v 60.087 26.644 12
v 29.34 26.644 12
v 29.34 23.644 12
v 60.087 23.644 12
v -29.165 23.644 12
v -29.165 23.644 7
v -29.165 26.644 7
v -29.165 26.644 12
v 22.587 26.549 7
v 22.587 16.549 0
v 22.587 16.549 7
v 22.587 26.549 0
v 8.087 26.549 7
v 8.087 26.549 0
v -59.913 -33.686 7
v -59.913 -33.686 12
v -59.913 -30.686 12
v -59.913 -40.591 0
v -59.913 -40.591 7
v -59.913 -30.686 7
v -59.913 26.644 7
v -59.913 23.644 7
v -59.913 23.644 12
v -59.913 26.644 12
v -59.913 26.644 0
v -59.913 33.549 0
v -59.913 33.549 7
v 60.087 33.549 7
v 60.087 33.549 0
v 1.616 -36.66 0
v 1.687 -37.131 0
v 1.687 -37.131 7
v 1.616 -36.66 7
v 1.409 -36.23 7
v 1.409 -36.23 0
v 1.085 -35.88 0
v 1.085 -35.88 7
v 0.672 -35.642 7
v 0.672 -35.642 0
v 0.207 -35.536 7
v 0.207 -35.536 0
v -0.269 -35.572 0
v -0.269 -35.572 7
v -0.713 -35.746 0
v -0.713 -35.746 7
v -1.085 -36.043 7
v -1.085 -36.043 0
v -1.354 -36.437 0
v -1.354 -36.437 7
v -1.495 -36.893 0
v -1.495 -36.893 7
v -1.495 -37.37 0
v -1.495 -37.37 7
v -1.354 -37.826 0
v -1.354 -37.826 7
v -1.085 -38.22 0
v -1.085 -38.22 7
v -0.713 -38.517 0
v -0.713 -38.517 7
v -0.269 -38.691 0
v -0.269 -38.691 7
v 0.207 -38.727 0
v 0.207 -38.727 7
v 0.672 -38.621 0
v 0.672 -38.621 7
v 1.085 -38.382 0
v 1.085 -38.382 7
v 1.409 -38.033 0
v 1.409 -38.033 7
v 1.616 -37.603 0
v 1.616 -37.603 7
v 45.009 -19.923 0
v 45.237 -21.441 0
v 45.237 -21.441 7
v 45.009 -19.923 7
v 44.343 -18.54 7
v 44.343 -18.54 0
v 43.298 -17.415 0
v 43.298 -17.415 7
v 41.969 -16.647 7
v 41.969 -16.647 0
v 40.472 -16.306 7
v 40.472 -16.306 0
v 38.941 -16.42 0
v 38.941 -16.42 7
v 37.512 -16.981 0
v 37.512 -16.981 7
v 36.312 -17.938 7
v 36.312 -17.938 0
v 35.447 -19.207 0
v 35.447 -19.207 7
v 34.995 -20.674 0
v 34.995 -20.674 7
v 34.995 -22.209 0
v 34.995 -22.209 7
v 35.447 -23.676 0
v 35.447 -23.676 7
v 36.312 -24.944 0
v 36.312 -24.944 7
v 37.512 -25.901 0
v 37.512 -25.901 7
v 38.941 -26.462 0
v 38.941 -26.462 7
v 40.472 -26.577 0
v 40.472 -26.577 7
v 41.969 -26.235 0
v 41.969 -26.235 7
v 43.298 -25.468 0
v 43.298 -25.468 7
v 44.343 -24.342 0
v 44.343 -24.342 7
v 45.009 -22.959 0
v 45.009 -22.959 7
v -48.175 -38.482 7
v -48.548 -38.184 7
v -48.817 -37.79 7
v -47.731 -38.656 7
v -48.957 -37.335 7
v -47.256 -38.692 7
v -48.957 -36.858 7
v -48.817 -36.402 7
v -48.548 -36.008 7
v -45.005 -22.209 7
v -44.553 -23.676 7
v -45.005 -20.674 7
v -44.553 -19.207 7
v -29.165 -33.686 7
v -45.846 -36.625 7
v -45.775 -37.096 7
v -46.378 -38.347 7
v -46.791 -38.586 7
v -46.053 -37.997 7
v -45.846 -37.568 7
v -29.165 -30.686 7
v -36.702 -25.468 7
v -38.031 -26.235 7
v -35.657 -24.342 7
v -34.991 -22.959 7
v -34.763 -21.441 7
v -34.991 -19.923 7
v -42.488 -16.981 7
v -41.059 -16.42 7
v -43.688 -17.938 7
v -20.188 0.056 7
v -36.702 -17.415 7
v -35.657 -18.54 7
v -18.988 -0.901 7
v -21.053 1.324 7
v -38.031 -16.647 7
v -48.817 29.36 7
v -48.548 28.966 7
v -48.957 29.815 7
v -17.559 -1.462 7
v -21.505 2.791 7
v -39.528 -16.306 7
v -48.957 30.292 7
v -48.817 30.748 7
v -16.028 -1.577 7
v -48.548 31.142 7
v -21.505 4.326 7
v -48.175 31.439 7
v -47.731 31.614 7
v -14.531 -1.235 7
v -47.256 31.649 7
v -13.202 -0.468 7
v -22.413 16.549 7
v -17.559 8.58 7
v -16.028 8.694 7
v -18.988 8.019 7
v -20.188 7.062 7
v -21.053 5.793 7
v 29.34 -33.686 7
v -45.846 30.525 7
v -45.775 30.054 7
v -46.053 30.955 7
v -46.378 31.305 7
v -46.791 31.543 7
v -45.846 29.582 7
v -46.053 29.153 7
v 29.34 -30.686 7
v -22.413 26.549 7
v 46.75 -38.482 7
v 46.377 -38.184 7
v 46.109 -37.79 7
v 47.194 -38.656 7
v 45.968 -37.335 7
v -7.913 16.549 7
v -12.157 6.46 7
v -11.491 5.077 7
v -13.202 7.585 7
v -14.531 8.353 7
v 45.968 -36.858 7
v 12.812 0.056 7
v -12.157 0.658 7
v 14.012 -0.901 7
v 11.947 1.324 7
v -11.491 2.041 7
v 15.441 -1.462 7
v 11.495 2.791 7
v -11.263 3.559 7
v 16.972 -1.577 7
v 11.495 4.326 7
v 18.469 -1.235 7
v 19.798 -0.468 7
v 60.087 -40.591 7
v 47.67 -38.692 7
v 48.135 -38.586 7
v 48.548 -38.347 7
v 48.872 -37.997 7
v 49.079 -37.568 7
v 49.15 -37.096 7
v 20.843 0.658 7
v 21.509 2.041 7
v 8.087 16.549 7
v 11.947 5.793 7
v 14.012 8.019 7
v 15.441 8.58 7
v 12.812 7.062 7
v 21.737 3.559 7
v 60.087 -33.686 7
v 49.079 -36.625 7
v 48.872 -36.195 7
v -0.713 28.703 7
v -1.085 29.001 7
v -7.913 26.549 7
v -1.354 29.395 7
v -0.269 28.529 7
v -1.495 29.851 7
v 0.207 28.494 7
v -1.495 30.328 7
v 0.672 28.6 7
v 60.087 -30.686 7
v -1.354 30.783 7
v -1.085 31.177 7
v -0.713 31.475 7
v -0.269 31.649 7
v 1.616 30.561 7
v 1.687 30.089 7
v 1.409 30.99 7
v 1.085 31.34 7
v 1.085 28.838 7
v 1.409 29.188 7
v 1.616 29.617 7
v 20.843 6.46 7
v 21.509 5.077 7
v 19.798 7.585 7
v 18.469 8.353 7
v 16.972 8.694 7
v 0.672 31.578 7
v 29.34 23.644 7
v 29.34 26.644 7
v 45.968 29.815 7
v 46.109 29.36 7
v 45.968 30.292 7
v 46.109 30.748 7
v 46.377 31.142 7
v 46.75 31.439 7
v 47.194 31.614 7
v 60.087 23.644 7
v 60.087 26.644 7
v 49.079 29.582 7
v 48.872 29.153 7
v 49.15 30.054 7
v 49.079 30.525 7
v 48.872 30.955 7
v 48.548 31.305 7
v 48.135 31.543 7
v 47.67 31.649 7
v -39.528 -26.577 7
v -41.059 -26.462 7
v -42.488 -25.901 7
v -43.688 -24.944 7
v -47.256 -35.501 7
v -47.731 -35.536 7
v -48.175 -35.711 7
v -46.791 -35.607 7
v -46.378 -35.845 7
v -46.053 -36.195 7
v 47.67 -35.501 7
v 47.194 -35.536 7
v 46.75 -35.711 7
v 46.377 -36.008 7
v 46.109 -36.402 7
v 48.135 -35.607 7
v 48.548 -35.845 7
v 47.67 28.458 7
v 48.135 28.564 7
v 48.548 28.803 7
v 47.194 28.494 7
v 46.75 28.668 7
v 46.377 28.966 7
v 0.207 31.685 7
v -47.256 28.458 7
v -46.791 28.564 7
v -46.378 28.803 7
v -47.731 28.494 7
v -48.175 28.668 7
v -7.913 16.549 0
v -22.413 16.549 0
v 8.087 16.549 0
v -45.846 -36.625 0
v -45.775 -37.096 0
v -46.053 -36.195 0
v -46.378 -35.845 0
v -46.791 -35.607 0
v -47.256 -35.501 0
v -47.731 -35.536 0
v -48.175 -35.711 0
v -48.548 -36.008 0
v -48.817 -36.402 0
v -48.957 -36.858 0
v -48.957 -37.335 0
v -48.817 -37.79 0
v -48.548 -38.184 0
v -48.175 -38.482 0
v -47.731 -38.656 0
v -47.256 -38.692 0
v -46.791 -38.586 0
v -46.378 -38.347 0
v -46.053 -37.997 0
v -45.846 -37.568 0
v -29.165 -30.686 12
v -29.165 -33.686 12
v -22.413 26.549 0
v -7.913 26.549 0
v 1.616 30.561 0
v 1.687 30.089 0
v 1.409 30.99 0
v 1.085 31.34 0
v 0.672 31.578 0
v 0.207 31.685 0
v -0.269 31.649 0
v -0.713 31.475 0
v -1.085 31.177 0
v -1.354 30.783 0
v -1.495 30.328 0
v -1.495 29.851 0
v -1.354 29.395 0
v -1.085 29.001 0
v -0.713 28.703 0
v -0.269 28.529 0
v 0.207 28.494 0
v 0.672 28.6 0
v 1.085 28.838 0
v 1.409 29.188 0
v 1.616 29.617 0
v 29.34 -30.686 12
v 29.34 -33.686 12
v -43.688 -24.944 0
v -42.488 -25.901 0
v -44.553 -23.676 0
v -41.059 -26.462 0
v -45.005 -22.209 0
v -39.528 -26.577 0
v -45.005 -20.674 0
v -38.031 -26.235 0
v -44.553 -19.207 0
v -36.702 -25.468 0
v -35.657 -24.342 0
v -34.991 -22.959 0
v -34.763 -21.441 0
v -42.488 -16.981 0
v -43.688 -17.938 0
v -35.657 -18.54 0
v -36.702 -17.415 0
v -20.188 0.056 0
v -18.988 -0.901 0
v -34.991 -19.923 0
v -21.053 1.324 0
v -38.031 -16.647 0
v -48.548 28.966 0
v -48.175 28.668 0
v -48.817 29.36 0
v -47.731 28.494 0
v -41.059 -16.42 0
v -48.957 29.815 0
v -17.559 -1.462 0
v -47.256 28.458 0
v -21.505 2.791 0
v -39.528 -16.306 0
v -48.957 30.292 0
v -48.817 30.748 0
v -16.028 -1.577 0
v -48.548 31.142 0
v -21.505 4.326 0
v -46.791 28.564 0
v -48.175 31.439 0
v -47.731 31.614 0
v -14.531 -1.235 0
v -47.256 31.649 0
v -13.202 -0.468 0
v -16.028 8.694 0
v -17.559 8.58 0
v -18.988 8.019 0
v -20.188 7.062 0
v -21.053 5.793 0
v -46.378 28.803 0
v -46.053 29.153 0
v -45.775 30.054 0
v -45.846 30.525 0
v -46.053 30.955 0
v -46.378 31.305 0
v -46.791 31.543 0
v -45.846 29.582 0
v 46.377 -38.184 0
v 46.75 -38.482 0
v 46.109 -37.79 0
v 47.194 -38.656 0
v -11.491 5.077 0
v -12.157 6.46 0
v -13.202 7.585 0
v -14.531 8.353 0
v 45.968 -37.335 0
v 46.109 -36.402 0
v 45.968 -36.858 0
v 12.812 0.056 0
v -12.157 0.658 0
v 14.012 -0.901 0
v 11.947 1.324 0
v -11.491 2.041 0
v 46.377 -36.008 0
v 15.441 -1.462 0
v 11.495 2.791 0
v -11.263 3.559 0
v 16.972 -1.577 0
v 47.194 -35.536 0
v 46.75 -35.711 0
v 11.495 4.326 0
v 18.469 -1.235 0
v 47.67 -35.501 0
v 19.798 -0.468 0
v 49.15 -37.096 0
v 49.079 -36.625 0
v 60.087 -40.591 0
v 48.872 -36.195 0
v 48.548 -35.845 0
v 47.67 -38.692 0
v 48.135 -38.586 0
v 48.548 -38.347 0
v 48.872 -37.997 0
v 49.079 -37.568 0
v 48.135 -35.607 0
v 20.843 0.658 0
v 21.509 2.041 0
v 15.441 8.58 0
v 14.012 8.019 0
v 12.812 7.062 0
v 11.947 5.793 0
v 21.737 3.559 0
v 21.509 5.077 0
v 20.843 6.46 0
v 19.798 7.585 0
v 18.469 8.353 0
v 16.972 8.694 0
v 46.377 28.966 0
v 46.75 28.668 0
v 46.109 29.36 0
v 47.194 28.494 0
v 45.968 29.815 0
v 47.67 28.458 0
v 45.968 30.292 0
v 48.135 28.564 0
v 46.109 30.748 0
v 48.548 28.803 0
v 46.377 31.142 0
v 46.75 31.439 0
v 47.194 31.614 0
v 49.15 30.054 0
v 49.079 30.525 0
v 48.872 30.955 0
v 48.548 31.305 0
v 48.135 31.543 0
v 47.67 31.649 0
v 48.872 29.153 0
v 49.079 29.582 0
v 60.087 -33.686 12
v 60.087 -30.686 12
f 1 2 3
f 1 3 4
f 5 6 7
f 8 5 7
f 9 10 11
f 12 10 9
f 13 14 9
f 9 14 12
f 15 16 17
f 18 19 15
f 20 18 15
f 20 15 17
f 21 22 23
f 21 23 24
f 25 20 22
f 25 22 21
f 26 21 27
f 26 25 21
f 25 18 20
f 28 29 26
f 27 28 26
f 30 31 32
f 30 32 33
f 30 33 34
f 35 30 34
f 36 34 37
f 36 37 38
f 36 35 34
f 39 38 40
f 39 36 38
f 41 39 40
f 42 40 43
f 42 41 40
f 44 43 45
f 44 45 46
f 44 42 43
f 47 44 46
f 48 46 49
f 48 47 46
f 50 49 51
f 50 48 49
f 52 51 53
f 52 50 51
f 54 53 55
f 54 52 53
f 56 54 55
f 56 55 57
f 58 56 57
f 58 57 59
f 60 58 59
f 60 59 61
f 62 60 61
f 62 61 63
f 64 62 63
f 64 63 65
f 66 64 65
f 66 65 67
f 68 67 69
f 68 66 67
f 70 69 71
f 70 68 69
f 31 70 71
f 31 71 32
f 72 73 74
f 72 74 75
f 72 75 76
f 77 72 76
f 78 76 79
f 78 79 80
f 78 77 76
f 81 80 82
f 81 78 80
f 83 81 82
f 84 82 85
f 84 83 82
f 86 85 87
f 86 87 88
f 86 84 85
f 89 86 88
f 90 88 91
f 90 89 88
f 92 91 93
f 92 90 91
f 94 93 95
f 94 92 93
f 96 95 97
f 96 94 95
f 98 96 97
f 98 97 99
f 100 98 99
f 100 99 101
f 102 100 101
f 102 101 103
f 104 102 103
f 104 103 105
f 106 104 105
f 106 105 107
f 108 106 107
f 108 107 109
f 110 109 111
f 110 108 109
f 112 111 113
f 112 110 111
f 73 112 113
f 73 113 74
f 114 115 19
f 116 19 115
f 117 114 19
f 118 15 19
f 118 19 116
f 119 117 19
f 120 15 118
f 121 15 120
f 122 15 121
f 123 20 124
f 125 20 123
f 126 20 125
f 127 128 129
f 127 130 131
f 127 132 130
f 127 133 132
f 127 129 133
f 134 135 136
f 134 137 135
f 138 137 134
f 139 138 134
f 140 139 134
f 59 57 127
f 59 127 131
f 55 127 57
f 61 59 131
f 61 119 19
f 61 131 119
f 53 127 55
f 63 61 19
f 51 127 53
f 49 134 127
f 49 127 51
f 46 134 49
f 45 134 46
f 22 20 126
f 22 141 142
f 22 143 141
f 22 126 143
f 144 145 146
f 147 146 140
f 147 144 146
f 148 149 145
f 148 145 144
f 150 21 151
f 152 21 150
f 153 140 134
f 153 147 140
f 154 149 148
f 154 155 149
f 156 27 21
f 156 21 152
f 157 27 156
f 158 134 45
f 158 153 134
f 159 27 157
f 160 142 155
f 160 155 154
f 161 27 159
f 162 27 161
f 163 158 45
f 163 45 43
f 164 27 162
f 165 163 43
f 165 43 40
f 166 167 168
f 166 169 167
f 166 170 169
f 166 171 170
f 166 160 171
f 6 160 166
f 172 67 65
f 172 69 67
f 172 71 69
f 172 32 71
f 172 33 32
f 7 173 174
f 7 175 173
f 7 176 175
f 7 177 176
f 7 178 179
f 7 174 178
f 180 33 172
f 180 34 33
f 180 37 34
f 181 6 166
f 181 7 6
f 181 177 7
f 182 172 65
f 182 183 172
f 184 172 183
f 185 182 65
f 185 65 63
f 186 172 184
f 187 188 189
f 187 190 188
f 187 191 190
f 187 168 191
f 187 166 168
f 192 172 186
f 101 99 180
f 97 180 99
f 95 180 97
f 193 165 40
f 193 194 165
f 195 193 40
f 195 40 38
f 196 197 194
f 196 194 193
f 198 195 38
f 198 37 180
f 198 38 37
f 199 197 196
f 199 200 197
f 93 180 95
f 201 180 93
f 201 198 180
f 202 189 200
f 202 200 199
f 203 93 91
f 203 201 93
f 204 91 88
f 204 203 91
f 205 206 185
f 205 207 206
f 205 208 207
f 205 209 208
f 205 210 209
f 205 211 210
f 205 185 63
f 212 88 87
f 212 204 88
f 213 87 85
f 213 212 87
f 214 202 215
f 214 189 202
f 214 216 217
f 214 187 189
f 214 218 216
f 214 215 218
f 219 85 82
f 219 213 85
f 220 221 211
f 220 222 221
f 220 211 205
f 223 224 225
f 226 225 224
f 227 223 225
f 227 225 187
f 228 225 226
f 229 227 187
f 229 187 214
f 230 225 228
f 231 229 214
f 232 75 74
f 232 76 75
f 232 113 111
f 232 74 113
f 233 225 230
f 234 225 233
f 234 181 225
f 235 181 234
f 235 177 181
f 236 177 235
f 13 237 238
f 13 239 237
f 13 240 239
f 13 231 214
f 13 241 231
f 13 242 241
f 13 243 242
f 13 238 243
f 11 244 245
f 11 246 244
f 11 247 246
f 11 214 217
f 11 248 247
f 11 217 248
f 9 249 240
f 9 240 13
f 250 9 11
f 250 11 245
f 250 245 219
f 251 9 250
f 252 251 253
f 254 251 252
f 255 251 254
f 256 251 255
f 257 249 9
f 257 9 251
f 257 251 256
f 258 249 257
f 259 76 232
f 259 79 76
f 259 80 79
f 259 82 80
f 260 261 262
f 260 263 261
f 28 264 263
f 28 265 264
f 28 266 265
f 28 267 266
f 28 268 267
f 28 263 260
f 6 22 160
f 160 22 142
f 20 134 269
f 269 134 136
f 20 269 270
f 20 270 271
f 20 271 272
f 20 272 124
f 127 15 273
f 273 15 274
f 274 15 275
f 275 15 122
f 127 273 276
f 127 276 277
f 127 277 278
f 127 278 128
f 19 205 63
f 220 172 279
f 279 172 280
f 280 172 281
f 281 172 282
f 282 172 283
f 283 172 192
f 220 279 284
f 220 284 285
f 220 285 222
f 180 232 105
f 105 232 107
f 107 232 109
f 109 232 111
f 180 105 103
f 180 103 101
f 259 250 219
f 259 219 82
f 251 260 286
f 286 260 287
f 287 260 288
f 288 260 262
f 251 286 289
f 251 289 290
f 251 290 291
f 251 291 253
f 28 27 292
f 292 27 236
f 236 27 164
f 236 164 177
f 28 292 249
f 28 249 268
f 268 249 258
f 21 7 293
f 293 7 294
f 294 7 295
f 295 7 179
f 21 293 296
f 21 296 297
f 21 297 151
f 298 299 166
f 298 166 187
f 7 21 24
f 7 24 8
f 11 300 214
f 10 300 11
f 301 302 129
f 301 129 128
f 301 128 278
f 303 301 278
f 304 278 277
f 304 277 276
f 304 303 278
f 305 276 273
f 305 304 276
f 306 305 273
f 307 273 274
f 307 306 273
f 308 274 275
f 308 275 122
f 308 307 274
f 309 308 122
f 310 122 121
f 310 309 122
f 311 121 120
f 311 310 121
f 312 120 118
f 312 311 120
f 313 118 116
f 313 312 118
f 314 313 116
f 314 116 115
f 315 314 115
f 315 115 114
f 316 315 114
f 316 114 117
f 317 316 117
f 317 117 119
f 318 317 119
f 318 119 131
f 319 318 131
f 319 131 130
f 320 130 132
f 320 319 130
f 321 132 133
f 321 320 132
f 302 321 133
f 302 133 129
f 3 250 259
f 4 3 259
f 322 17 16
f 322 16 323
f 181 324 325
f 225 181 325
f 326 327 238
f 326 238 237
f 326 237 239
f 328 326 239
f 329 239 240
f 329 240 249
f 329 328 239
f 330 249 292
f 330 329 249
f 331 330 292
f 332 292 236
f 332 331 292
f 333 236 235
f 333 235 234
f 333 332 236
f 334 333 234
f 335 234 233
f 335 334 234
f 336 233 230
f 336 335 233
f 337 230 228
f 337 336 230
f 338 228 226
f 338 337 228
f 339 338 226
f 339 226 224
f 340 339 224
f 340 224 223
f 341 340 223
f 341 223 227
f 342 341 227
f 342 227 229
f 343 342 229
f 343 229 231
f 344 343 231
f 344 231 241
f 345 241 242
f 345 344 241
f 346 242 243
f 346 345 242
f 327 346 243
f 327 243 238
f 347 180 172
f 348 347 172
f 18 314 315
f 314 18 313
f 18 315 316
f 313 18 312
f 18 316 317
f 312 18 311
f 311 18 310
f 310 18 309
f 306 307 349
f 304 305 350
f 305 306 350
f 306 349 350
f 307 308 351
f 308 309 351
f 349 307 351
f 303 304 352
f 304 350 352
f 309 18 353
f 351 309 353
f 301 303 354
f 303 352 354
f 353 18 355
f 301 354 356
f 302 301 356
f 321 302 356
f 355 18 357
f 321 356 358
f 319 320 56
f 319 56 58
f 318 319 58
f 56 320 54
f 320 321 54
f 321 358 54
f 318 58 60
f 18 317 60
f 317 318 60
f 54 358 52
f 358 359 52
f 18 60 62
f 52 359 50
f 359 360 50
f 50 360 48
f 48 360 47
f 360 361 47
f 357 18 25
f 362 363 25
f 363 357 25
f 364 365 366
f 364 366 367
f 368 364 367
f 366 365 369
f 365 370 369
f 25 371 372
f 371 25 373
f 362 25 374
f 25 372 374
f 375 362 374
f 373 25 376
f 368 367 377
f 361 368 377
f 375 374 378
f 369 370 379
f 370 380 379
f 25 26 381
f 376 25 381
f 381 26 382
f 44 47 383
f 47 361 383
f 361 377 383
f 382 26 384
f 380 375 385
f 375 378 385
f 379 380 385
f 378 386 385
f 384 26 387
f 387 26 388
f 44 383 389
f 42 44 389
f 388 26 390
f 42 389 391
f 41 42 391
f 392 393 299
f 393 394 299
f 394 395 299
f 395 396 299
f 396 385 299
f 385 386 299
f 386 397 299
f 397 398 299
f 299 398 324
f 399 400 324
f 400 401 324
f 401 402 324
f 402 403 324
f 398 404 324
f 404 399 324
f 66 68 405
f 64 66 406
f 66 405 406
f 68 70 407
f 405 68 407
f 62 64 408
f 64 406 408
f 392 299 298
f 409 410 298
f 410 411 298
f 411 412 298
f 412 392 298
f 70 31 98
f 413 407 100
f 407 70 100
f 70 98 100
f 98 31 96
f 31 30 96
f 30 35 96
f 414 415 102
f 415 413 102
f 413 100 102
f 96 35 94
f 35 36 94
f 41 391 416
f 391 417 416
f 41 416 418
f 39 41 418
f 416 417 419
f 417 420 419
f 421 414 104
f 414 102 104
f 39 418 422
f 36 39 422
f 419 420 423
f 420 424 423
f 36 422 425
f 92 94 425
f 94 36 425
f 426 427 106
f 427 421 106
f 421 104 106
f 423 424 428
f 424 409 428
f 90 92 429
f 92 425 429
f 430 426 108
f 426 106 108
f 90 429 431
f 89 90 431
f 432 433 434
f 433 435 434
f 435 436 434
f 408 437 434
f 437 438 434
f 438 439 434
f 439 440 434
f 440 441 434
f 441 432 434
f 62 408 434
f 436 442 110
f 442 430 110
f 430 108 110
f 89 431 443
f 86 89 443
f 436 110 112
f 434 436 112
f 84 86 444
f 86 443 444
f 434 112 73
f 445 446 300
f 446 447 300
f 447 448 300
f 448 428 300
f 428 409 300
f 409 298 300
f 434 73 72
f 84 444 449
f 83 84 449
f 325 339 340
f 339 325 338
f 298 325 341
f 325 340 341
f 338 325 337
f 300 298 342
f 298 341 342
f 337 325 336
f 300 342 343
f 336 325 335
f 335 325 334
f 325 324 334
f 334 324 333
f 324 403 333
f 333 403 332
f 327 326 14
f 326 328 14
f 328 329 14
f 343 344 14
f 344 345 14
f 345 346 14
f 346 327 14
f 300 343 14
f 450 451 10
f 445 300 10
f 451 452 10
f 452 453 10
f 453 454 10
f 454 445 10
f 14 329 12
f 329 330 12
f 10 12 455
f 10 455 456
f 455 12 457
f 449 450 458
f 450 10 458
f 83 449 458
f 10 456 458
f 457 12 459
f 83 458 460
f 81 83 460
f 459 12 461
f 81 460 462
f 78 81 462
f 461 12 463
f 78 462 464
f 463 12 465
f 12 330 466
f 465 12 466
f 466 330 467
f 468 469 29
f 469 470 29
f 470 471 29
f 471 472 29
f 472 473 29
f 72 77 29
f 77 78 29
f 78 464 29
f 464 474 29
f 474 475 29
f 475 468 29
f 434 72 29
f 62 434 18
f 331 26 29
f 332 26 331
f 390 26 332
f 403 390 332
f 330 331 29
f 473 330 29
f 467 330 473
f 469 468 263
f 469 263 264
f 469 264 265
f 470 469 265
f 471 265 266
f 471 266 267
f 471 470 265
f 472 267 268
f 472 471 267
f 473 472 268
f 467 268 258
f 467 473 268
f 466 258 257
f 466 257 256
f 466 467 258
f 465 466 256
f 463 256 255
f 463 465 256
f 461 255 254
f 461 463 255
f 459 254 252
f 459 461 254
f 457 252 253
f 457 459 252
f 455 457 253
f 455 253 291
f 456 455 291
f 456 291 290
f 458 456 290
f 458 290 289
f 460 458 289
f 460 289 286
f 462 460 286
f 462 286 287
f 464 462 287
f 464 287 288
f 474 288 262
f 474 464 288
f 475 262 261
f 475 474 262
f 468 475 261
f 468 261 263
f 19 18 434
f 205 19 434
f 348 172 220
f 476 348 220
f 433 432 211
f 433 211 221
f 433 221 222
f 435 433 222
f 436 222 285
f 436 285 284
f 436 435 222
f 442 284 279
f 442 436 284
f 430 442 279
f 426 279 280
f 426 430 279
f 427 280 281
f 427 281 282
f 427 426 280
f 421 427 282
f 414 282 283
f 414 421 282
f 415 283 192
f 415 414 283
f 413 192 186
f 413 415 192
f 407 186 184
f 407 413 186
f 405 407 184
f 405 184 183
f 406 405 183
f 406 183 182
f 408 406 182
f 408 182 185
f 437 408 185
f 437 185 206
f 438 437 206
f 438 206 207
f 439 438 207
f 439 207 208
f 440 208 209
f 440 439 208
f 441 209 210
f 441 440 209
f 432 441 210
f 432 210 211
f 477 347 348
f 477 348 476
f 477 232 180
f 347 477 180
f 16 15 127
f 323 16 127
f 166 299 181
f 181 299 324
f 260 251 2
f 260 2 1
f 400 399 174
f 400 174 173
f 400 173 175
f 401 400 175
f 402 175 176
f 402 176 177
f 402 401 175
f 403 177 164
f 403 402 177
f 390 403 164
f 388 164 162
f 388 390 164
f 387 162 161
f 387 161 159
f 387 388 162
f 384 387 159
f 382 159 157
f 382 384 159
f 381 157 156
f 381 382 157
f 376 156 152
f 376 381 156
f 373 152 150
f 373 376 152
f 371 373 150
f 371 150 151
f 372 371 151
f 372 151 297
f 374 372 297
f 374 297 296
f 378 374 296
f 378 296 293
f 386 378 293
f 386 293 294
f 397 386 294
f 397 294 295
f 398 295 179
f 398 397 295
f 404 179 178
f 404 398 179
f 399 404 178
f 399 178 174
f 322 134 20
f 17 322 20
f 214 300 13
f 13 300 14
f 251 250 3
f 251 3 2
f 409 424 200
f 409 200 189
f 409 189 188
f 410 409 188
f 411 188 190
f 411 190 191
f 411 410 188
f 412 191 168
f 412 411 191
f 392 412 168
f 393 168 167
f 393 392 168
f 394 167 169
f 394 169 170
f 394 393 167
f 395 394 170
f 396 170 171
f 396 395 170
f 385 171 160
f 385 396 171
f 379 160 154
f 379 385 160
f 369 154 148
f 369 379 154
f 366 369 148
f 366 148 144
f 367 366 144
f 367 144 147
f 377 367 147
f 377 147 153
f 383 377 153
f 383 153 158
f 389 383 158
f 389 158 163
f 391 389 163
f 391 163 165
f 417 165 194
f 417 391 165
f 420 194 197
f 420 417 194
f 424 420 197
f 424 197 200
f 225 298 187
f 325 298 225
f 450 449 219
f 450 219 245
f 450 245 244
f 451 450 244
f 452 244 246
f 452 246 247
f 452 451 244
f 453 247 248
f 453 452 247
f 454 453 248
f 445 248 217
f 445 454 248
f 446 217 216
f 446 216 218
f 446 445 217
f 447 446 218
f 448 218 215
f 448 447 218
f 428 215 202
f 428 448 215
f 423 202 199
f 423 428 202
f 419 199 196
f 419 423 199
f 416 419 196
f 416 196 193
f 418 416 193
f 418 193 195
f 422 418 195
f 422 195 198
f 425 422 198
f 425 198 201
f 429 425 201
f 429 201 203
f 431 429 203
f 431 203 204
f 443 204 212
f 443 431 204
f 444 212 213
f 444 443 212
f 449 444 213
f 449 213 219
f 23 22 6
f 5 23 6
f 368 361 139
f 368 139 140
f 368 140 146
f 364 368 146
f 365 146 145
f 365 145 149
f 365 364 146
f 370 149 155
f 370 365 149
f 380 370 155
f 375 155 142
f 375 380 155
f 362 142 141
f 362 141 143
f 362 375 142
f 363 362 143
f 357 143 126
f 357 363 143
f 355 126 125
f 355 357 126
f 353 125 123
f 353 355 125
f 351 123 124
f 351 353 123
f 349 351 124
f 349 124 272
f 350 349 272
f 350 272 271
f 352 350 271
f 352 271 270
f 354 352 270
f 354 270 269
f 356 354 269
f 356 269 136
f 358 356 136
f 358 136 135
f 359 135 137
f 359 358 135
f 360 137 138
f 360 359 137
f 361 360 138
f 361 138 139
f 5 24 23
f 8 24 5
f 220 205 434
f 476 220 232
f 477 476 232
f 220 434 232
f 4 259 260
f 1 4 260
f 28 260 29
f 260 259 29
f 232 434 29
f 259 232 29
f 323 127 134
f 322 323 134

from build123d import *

# Parameters (mm, degrees)
ESBO_O1_R                = 1.6
ESBO_O1_R_2              = 5.15
ESBO_O1_W                = 14.5
ESBO_O1_H                = 10
ESBO_O1_W_2              = 30.747802568
ESBO_O1_H_2              = 3
ESBO_O1_W_3              = 30.747802569
RESSALTO_EXTRUS_O1_DEPTH = 7
RESSALTO_EXTRUS_O3_START = 7
ESBO_O1_5_W              = 30.747802569
ESBO_O1_5_H              = 3
ESBO_O1_5_W_2            = 30.747802568
RESSALTO_EXTRUS_O3_DEPTH = 5


with BuildPart() as part:
    # Esboço1 → Ressalto-extrusão1 (new body)
    # profile 1 of 5: a face of its own
    with BuildSketch(Plane.XY):
        Polygon((60.087398189, 33.548797322), (-59.912601811, 33.548797322), (-59.912601811, 26.644004496), (-29.164799242, 26.644004496), (-29.164799242, 23.644004496), (-59.912601811, 23.644004496), (-59.912601811, -30.686339735), (-29.164799242, -30.686339735), (-29.164799242, -33.686339735), (-59.912601811, -33.686339735), (-59.912601811, -40.591132561), (60.087398189, -40.591132561), (60.087398189, -33.686339735), (29.339595621, -33.686339735), (29.339595621, -30.686339735), (60.087398189, -30.686339735), (60.087398189, 23.644004496), (29.339595621, 23.644004496), (29.339595621, 26.644004496), (60.087398189, 26.644004496), align=None)
        with Locations((-47.375288378, -37.09616762)):
            Circle(ESBO_O1_R, mode=Mode.SUBTRACT)
        with Locations((0.087398189, -37.13140726)):
            Circle(ESBO_O1_R, mode=Mode.SUBTRACT)
        with Locations((-39.912601811, -21.441132561)):
            Circle(ESBO_O1_R_2, mode=Mode.SUBTRACT)
        with Locations((47.550084756, -37.09616762)):
            Circle(ESBO_O1_R, mode=Mode.SUBTRACT)
        with Locations((40.087398189, -21.441132561)):
            Circle(ESBO_O1_R_2, mode=Mode.SUBTRACT)
        with Locations((-16.412601811, 3.558867439)):
            Circle(ESBO_O1_R_2, mode=Mode.SUBTRACT)
        with Locations((-47.375288378, 30.05383238)):
            Circle(ESBO_O1_R, mode=Mode.SUBTRACT)
        with Locations((-15.162601811, 21.548797322)):
            Rectangle(ESBO_O1_W, ESBO_O1_H, mode=Mode.SUBTRACT)
        with Locations((0.087398189, 30.08907202)):
            Circle(ESBO_O1_R, mode=Mode.SUBTRACT)
        with Locations((16.587398189, 3.558867439)):
            Circle(ESBO_O1_R_2, mode=Mode.SUBTRACT)
        with Locations((15.337398189, 21.548797322)):
            Rectangle(ESBO_O1_W, ESBO_O1_H, mode=Mode.SUBTRACT)
        with Locations((47.550084756, 30.05383238)):
            Circle(ESBO_O1_R, mode=Mode.SUBTRACT)
    # profile 2 of 5: a face of its own
    with BuildSketch(Plane.XY):
        Polygon((-29.164799242, -30.686339735), (-59.912601811, -30.686339735), (-59.912601811, -33.451202678), (-59.912601811, -33.686339735), (-29.164799242, -33.686339735), align=None)
    # profile 3 of 5: a face of its own
    with BuildSketch(Plane.XY):
        Polygon((60.087398189, -33.646676702), (60.087398189, -30.686339735), (29.339595621, -30.686339735), (29.339595621, -33.686339735), (60.087398189, -33.686339735), align=None)
    # profile 4 of 5: a face of its own
    with BuildSketch(Plane.XY):
        with Locations((44.713496905, 25.144004496)):
            Rectangle(ESBO_O1_W_2, ESBO_O1_H_2)
    # profile 5 of 5: a face of its own
    with BuildSketch(Plane.XY):
        with Locations((-44.538700527, 25.144004496)):
            Rectangle(ESBO_O1_W_3, ESBO_O1_H_2)
    extrude(amount=RESSALTO_EXTRUS_O1_DEPTH)

    # Esboço1<5> → Ressalto-extrusão3 (add)
    with BuildSketch(Plane.XY.offset(RESSALTO_EXTRUS_O3_START)):
        with Locations((-44.538700527, 25.144004496)):
            Rectangle(ESBO_O1_5_W, ESBO_O1_5_H)
        with Locations((44.713496905, 25.144004496)):
            Rectangle(ESBO_O1_5_W_2, ESBO_O1_5_H)
        Polygon((-29.164799242, -30.686339735), (-59.912601811, -30.686339735), (-59.912601811, -33.451202678), (-59.912601811, -33.686339735), (-29.164799242, -33.686339735), align=None)
        Polygon((60.087398189, -33.646676702), (60.087398189, -30.686339735), (29.339595621, -30.686339735), (29.339595621, -33.686339735), (60.087398189, -33.686339735), align=None)
    extrude(amount=RESSALTO_EXTRUS_O3_DEPTH)


solid = part.part
